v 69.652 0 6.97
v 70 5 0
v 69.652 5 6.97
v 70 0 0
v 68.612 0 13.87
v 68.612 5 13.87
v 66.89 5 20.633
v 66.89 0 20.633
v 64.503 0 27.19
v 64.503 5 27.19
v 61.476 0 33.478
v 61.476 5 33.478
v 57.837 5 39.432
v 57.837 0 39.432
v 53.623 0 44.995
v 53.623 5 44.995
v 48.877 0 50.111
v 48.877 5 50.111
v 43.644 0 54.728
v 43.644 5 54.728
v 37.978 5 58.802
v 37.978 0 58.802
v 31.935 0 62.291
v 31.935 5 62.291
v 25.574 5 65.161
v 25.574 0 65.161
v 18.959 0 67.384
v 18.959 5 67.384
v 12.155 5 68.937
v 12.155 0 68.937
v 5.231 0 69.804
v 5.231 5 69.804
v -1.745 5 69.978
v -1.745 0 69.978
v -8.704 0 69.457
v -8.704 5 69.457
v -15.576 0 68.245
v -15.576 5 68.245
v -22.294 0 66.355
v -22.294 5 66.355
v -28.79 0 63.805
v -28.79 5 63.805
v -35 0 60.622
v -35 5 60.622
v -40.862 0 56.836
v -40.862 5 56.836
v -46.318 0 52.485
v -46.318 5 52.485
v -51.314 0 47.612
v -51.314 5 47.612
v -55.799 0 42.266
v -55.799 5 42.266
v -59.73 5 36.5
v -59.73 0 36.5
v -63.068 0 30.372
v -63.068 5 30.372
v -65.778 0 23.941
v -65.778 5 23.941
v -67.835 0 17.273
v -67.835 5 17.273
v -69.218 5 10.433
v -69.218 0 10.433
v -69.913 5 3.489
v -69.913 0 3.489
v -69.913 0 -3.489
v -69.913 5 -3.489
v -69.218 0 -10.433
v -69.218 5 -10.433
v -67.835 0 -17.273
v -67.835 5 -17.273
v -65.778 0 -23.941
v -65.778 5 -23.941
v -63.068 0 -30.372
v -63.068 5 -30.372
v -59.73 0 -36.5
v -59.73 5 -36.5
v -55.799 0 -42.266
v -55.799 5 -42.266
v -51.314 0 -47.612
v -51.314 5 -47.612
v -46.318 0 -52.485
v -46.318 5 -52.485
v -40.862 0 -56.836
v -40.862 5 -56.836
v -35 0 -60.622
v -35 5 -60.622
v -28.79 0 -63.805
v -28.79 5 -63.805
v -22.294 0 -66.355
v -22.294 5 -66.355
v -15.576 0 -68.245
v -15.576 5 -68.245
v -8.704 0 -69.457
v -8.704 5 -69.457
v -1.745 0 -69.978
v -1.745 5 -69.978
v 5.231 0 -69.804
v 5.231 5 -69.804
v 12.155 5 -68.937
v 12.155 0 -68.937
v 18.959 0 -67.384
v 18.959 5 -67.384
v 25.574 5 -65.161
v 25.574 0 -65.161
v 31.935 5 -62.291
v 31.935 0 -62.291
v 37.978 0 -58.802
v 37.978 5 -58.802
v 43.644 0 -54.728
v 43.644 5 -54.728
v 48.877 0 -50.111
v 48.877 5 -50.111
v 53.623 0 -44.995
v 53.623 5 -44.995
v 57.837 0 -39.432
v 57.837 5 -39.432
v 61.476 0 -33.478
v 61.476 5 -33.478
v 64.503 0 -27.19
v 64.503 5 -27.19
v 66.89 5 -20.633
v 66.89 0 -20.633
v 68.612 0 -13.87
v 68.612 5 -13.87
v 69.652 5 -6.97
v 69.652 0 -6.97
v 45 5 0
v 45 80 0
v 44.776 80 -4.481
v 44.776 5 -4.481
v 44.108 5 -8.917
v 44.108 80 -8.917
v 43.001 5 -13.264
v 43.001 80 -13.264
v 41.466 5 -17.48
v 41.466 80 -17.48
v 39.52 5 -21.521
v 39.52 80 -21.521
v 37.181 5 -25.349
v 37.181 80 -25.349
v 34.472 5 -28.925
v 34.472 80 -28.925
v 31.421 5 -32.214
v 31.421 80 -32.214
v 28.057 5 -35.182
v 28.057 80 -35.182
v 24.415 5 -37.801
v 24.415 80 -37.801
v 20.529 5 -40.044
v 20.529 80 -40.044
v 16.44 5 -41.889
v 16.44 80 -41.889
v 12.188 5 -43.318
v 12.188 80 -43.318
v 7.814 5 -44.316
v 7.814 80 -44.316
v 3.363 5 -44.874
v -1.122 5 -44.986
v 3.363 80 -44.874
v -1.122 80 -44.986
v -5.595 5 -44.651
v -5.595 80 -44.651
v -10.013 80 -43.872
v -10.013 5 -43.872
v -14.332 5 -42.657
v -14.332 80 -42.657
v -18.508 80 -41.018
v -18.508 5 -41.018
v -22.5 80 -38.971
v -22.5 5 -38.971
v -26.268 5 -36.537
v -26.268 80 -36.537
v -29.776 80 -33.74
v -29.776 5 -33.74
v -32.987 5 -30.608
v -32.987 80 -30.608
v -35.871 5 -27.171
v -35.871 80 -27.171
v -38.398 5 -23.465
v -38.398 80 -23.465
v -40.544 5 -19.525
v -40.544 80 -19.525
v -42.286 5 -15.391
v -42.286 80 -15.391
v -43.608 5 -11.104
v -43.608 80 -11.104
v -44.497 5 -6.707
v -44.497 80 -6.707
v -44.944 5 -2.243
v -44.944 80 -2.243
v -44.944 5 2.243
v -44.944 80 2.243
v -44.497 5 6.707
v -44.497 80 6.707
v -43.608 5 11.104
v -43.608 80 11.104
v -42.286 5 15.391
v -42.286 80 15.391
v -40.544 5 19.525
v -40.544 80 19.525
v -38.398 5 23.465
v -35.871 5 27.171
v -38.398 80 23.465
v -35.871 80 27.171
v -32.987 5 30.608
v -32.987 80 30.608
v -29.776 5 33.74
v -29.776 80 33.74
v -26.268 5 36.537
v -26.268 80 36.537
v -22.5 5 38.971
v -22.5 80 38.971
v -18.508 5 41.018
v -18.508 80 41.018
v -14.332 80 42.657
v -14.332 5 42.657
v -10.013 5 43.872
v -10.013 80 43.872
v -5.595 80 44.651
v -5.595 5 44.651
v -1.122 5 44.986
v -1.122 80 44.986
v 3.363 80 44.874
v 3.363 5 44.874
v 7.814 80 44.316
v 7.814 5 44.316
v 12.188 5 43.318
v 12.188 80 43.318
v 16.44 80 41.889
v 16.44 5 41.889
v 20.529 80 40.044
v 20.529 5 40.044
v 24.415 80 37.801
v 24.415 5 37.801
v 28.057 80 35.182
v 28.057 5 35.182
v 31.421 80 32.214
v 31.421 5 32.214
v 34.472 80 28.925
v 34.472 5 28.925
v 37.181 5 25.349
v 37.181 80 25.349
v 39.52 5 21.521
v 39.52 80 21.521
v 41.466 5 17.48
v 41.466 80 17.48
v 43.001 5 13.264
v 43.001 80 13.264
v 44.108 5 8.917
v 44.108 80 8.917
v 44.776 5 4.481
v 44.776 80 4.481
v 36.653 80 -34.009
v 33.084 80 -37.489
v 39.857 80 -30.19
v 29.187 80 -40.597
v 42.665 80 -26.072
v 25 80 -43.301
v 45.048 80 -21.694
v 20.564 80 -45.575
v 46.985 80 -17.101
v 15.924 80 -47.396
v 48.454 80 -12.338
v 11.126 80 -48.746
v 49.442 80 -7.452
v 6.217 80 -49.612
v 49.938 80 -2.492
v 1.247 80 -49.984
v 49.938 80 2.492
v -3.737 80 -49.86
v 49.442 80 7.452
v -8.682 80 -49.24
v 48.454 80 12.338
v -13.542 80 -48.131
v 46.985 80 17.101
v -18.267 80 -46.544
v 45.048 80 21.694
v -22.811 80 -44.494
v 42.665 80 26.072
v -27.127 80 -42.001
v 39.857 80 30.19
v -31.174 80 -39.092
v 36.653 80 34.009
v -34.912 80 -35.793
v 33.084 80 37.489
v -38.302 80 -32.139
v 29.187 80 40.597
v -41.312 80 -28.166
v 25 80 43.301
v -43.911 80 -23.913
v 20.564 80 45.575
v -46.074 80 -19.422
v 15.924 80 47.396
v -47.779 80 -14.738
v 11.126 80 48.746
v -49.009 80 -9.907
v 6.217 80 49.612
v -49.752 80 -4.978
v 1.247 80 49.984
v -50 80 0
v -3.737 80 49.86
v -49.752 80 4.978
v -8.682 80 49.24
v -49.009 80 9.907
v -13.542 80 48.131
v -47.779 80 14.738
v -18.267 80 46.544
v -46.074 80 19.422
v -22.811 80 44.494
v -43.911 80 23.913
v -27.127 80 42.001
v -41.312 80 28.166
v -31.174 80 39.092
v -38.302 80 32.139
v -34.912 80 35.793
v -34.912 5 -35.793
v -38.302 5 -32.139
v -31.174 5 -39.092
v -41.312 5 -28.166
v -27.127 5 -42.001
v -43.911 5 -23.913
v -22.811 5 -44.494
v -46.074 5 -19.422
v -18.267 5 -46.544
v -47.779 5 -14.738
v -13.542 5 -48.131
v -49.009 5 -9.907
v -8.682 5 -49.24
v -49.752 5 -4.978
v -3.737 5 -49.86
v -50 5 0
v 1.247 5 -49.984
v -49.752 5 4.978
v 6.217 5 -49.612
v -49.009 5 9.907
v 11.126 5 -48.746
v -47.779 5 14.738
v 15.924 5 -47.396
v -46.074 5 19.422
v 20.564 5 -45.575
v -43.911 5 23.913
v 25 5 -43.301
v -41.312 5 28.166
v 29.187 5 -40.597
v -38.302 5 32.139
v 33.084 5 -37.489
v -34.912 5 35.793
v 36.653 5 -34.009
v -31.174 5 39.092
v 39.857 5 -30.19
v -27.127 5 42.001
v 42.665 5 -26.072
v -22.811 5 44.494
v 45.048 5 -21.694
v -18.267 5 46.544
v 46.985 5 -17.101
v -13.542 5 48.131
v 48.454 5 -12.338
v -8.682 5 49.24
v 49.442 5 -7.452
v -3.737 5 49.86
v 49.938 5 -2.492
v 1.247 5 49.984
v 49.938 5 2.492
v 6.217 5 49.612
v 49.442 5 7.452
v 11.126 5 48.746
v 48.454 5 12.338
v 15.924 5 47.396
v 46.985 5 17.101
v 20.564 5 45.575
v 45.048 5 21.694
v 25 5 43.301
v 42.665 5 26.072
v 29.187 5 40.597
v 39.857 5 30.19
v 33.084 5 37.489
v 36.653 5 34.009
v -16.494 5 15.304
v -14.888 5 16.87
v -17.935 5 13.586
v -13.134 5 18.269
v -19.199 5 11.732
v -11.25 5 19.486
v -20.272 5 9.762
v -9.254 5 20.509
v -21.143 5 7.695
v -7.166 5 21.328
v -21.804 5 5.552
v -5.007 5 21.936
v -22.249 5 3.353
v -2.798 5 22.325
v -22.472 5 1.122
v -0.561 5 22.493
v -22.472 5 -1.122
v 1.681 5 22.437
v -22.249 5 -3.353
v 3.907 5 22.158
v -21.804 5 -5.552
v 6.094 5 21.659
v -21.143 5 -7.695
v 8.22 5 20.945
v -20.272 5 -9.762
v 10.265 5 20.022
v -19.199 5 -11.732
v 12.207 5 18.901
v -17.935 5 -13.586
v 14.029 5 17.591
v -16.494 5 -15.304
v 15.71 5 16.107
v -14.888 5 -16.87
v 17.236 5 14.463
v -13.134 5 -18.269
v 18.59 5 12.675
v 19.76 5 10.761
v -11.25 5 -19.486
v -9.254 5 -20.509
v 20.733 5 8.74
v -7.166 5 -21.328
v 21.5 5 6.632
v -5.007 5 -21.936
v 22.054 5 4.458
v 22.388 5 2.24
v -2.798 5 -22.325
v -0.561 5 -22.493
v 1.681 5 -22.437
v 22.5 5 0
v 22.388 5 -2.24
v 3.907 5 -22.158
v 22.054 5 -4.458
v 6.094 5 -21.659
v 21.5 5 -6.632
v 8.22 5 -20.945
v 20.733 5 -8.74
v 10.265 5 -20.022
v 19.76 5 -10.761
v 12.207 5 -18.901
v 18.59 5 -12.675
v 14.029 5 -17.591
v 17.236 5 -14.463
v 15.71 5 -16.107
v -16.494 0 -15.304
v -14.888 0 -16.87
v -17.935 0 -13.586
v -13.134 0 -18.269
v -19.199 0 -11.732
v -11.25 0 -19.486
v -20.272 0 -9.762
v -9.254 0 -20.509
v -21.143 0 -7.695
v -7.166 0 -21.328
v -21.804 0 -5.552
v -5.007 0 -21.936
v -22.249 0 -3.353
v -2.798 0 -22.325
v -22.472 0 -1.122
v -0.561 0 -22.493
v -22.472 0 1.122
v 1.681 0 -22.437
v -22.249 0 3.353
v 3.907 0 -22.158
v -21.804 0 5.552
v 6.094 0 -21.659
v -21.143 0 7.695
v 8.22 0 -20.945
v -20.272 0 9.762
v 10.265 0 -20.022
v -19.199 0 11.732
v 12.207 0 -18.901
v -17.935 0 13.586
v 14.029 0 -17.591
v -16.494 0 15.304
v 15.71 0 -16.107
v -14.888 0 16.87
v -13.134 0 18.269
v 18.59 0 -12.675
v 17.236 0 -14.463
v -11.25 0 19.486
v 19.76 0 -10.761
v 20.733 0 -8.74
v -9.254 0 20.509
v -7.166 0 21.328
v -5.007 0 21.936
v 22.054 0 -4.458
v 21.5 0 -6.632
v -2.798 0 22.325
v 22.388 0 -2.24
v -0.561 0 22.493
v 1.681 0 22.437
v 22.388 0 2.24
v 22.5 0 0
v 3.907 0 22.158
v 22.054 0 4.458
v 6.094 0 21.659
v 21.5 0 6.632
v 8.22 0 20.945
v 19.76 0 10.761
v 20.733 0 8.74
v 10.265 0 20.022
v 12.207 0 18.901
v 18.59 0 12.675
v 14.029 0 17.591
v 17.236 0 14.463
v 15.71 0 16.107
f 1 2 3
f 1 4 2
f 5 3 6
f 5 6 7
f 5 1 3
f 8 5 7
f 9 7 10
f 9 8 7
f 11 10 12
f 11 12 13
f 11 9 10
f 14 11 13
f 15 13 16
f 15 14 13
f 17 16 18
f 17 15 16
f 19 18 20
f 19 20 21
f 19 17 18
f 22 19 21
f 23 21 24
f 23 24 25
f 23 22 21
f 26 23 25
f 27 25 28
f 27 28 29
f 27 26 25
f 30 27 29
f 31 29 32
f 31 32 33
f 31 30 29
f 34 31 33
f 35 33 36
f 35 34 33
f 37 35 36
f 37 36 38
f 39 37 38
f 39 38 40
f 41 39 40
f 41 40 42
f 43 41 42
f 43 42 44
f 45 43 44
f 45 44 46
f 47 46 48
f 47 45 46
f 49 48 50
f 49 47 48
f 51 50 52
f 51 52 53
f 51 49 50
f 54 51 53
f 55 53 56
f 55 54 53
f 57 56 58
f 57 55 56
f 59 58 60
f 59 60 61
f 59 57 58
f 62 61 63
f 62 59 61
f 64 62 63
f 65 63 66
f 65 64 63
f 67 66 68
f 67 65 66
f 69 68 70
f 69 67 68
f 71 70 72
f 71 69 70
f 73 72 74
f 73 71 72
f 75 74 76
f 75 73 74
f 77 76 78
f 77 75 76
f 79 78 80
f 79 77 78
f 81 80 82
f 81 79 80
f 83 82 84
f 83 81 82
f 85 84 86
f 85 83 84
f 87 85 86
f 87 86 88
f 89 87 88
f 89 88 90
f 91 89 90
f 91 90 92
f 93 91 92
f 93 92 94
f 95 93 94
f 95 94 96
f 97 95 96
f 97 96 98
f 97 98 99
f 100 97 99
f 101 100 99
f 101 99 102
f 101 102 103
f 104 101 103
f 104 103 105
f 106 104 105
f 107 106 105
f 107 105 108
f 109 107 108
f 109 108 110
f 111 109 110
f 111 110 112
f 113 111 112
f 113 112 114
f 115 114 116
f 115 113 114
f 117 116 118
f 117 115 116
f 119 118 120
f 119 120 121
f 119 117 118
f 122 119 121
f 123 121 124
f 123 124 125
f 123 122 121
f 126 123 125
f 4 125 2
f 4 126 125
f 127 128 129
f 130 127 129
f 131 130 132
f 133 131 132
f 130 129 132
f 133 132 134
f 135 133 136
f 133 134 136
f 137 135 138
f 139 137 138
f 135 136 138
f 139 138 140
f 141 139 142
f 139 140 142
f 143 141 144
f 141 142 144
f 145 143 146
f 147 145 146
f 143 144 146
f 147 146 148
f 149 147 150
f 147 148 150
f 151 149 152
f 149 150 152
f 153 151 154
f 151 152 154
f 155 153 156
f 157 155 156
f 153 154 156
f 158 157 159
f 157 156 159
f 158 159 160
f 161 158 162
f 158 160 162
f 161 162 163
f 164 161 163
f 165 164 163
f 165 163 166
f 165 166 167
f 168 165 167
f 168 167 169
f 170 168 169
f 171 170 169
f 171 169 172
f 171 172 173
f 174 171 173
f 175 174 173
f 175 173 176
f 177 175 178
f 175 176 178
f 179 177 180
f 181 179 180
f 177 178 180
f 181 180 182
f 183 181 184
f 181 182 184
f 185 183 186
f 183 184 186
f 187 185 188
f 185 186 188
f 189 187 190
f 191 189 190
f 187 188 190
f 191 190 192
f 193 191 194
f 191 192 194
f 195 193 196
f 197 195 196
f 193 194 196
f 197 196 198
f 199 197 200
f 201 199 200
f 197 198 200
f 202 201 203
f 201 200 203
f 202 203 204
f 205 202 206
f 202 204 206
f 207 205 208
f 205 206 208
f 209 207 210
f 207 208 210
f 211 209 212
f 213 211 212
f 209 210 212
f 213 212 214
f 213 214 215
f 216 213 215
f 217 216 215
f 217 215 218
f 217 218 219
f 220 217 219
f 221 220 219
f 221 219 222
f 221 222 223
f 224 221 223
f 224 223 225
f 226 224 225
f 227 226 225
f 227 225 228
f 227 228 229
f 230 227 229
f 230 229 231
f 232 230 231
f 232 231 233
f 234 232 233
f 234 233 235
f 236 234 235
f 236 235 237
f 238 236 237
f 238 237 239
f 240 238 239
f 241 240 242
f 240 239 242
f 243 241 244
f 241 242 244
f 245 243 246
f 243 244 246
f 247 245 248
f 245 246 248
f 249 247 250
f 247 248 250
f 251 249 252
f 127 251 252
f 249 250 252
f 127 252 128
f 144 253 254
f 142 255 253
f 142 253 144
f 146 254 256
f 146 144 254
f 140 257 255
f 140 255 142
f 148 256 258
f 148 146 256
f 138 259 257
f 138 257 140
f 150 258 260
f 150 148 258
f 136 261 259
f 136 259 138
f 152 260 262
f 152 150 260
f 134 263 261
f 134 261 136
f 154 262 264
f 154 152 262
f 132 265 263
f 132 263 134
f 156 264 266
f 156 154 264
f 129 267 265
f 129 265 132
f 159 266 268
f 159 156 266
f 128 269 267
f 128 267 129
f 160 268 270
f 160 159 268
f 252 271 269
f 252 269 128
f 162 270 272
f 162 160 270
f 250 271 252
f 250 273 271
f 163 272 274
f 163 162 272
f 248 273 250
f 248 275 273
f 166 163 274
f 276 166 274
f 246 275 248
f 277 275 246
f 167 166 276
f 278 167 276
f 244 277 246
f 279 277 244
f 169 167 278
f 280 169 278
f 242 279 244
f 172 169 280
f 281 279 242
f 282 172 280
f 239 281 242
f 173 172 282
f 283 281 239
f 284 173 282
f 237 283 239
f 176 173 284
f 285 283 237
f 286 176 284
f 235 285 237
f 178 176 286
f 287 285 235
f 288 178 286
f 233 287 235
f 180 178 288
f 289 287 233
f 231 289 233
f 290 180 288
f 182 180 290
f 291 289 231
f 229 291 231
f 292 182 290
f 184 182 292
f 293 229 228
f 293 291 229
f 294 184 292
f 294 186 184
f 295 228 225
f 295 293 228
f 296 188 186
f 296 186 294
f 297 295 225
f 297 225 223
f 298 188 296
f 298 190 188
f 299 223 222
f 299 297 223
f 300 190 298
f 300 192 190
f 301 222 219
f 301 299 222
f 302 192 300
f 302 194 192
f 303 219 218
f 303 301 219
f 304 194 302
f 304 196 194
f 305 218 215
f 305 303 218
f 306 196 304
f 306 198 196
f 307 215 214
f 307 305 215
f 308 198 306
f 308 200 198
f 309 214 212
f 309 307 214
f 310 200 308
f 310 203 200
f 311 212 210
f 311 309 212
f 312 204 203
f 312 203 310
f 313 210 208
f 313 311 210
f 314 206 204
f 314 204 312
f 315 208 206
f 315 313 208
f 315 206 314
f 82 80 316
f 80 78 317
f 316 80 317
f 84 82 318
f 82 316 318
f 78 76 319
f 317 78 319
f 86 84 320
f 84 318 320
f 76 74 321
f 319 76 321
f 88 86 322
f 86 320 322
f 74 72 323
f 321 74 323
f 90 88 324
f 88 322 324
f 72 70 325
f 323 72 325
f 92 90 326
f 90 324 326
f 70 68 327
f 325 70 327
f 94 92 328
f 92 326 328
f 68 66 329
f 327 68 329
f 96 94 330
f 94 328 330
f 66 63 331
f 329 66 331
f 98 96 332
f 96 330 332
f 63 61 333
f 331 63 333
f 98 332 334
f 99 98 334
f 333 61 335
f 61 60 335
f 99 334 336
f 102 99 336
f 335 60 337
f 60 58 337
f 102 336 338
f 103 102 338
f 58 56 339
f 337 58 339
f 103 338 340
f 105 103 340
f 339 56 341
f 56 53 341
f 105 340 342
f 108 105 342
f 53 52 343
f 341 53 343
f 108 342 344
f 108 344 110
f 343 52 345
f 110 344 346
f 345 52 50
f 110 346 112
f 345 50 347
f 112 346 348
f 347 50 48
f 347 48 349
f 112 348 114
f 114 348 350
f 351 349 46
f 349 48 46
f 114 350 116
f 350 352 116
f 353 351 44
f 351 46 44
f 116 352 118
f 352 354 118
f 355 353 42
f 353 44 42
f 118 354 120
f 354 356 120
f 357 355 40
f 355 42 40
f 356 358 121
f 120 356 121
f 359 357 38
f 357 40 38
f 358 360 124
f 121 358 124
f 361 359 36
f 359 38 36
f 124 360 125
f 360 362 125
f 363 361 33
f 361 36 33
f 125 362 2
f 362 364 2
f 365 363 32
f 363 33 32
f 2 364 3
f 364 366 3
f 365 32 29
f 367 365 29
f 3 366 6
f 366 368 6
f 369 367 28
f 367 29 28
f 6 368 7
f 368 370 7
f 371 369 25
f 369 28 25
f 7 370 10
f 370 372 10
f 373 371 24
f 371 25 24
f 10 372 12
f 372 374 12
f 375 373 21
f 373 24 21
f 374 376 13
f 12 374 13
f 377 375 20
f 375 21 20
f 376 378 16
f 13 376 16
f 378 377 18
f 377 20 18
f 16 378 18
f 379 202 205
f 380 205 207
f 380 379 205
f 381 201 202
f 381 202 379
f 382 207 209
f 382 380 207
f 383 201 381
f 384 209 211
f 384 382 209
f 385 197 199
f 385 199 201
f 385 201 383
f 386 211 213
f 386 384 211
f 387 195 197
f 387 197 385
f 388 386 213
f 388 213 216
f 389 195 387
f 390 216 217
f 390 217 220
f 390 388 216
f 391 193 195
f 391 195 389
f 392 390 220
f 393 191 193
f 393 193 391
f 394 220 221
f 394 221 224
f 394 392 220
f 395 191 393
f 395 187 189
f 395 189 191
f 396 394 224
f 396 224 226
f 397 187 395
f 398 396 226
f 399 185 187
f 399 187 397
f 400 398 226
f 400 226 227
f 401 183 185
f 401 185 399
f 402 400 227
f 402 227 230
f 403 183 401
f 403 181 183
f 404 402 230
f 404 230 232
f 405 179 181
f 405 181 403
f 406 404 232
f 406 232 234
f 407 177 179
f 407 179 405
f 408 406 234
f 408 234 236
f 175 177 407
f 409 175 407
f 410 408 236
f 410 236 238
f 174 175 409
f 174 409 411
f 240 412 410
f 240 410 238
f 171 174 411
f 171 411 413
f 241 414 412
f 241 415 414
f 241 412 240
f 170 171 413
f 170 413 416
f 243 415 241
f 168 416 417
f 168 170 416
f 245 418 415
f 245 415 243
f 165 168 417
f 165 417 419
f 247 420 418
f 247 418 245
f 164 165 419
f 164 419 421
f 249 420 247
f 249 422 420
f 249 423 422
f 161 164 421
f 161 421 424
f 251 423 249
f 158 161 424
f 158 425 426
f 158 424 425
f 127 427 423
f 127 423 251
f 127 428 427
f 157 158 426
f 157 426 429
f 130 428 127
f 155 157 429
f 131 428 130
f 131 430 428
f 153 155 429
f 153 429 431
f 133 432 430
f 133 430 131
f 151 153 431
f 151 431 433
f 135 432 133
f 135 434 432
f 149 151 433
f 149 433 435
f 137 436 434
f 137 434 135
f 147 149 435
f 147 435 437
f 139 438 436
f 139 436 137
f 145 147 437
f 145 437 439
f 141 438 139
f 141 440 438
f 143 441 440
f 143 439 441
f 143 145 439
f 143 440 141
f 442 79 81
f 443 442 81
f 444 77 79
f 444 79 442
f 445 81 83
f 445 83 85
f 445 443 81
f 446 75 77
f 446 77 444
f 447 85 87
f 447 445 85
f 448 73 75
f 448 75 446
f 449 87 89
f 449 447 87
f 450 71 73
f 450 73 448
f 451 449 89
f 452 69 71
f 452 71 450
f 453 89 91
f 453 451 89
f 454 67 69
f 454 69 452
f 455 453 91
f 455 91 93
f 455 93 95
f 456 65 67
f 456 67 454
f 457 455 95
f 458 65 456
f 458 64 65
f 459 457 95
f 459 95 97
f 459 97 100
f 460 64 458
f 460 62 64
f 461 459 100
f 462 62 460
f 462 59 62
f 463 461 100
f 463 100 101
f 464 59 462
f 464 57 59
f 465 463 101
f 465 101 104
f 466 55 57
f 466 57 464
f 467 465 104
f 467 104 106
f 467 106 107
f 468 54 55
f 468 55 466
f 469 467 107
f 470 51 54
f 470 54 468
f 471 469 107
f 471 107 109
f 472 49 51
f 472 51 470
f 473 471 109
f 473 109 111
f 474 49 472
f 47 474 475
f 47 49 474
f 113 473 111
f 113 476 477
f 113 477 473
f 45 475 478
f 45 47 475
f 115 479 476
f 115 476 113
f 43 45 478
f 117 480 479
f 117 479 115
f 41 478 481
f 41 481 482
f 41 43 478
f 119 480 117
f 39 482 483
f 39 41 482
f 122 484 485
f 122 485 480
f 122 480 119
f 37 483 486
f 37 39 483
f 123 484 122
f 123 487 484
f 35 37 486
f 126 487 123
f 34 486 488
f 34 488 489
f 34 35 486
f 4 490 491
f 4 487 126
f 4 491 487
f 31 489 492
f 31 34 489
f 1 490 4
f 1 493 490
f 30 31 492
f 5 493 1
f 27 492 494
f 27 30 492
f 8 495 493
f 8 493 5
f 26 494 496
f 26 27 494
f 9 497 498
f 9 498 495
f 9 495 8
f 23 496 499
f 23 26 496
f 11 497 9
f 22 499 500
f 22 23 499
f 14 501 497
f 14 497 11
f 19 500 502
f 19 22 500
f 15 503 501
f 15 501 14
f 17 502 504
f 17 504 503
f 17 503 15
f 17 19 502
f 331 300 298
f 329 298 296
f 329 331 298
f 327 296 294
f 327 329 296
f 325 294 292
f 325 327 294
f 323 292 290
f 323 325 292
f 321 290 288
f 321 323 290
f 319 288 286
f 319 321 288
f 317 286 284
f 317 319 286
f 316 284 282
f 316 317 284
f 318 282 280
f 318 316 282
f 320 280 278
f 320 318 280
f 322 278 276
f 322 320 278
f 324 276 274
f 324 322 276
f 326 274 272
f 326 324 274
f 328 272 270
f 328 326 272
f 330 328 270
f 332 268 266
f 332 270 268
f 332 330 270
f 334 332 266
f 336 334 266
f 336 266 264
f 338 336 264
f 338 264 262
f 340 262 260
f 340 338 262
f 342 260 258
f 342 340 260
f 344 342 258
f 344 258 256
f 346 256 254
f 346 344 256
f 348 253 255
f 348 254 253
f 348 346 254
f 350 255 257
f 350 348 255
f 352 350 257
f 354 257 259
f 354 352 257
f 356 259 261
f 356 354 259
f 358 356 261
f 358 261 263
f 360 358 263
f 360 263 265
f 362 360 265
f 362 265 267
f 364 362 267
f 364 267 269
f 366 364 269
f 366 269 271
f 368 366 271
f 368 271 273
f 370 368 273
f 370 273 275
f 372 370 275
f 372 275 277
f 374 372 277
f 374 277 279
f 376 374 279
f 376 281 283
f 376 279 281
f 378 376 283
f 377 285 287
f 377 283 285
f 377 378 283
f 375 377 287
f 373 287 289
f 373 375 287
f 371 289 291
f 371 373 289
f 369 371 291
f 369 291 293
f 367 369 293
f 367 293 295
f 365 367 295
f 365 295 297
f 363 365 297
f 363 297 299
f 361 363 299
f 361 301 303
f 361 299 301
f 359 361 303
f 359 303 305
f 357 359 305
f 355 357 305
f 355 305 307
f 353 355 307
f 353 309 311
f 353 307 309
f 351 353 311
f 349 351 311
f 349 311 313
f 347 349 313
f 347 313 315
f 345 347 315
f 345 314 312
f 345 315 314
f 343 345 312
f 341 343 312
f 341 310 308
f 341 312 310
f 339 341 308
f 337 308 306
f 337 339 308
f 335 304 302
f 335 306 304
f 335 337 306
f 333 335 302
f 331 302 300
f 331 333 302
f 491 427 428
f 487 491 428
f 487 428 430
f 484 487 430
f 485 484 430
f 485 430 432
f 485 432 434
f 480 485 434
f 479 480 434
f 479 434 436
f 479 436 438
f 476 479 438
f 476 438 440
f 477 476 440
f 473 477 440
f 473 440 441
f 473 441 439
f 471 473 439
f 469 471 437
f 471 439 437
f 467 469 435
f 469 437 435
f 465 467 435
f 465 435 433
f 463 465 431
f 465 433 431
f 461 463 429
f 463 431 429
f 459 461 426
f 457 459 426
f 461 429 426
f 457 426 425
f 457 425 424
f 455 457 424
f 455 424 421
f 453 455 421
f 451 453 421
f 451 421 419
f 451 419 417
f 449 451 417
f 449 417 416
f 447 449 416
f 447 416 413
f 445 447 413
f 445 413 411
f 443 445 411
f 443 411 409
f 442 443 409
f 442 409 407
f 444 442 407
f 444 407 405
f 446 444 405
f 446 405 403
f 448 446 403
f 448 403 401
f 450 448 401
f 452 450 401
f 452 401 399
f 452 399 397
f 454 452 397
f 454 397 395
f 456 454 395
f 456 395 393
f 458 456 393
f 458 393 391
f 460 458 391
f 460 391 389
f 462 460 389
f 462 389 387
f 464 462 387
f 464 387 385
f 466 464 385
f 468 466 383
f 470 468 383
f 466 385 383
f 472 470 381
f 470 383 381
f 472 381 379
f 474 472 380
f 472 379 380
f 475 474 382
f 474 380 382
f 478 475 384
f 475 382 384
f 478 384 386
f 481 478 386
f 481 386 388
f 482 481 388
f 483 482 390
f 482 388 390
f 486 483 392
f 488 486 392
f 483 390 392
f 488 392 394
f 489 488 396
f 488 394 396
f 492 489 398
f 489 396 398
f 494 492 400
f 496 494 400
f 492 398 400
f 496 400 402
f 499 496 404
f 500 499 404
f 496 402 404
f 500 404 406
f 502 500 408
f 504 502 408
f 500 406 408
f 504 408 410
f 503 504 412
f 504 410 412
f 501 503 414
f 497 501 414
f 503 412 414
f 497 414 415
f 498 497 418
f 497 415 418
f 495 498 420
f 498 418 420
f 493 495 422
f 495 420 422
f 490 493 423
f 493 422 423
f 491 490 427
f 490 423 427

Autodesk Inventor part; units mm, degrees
ref_plane "YZ Plane" through (0, 0, 0) normal (1, 0, 0) x (0, 1, 0)
ref_plane "XZ Plane" through (0, 0, 0) normal (0, 1, 0) x (-1, 0, 0)
ref_plane "XY Plane" through (0, 0, 0) normal (0, 0, 1) x (1, 0, 0)
sketch "Szkic1" plane through (0, 0, 0) normal (0, 1, 0) x (-1, 0, 0)
  circle A0 centre (0, 0) radius 50
  dimension "d0" = 100
extrude "Wyciągnięcie proste1" add sketch "Szkic1" along normal blind 80
sketch "Szkic2" plane through (0, 80, 0) normal (0, 1, 0) x (1, 0, 0)
  circle A0 centre (0, 0) radius 45
  dimension "d3" = 90
extrude "Wyciągnięcie proste2" cut sketch "Szkic2" against normal blind 75
sketch "Szkic3" plane through (0, 5, 0) normal (0, 1, 0) x (1, 0, 0)
  point P0 (0, 0)
sketch "Szkic4" plane through (0, 5, 0) normal (0, 1, 0) x (1, 0, 0)
  circle A0 centre (0, 0) radius 22.5
  dimension "d6" = 45
extrude "Wyciągnięcie proste3" cut sketch "Szkic4" against normal blind 75
sketch "Szkic9" plane through (0, 5, 0) normal (0, 1, 0) x (1, 0, 0)
  point P0 (0, 0)
sketch "Szkic10" plane through (0, 0, 0) normal (0, -1, 0) x (1, 0, 0)
  circle A0 centre (0, 0) radius 70
  circle A1 centre (0, 0) radius 40.2417
  dimension "d14" = 140
extrude "Wyciągnięcie proste4" add sketch "Szkic10" against normal blind 5
sketch "Szkic11" plane through (0, 5, 0) normal (0, 1, 0) x (1, 0, 0)
  point P0 (0, 0)
properties part number "Walec"
